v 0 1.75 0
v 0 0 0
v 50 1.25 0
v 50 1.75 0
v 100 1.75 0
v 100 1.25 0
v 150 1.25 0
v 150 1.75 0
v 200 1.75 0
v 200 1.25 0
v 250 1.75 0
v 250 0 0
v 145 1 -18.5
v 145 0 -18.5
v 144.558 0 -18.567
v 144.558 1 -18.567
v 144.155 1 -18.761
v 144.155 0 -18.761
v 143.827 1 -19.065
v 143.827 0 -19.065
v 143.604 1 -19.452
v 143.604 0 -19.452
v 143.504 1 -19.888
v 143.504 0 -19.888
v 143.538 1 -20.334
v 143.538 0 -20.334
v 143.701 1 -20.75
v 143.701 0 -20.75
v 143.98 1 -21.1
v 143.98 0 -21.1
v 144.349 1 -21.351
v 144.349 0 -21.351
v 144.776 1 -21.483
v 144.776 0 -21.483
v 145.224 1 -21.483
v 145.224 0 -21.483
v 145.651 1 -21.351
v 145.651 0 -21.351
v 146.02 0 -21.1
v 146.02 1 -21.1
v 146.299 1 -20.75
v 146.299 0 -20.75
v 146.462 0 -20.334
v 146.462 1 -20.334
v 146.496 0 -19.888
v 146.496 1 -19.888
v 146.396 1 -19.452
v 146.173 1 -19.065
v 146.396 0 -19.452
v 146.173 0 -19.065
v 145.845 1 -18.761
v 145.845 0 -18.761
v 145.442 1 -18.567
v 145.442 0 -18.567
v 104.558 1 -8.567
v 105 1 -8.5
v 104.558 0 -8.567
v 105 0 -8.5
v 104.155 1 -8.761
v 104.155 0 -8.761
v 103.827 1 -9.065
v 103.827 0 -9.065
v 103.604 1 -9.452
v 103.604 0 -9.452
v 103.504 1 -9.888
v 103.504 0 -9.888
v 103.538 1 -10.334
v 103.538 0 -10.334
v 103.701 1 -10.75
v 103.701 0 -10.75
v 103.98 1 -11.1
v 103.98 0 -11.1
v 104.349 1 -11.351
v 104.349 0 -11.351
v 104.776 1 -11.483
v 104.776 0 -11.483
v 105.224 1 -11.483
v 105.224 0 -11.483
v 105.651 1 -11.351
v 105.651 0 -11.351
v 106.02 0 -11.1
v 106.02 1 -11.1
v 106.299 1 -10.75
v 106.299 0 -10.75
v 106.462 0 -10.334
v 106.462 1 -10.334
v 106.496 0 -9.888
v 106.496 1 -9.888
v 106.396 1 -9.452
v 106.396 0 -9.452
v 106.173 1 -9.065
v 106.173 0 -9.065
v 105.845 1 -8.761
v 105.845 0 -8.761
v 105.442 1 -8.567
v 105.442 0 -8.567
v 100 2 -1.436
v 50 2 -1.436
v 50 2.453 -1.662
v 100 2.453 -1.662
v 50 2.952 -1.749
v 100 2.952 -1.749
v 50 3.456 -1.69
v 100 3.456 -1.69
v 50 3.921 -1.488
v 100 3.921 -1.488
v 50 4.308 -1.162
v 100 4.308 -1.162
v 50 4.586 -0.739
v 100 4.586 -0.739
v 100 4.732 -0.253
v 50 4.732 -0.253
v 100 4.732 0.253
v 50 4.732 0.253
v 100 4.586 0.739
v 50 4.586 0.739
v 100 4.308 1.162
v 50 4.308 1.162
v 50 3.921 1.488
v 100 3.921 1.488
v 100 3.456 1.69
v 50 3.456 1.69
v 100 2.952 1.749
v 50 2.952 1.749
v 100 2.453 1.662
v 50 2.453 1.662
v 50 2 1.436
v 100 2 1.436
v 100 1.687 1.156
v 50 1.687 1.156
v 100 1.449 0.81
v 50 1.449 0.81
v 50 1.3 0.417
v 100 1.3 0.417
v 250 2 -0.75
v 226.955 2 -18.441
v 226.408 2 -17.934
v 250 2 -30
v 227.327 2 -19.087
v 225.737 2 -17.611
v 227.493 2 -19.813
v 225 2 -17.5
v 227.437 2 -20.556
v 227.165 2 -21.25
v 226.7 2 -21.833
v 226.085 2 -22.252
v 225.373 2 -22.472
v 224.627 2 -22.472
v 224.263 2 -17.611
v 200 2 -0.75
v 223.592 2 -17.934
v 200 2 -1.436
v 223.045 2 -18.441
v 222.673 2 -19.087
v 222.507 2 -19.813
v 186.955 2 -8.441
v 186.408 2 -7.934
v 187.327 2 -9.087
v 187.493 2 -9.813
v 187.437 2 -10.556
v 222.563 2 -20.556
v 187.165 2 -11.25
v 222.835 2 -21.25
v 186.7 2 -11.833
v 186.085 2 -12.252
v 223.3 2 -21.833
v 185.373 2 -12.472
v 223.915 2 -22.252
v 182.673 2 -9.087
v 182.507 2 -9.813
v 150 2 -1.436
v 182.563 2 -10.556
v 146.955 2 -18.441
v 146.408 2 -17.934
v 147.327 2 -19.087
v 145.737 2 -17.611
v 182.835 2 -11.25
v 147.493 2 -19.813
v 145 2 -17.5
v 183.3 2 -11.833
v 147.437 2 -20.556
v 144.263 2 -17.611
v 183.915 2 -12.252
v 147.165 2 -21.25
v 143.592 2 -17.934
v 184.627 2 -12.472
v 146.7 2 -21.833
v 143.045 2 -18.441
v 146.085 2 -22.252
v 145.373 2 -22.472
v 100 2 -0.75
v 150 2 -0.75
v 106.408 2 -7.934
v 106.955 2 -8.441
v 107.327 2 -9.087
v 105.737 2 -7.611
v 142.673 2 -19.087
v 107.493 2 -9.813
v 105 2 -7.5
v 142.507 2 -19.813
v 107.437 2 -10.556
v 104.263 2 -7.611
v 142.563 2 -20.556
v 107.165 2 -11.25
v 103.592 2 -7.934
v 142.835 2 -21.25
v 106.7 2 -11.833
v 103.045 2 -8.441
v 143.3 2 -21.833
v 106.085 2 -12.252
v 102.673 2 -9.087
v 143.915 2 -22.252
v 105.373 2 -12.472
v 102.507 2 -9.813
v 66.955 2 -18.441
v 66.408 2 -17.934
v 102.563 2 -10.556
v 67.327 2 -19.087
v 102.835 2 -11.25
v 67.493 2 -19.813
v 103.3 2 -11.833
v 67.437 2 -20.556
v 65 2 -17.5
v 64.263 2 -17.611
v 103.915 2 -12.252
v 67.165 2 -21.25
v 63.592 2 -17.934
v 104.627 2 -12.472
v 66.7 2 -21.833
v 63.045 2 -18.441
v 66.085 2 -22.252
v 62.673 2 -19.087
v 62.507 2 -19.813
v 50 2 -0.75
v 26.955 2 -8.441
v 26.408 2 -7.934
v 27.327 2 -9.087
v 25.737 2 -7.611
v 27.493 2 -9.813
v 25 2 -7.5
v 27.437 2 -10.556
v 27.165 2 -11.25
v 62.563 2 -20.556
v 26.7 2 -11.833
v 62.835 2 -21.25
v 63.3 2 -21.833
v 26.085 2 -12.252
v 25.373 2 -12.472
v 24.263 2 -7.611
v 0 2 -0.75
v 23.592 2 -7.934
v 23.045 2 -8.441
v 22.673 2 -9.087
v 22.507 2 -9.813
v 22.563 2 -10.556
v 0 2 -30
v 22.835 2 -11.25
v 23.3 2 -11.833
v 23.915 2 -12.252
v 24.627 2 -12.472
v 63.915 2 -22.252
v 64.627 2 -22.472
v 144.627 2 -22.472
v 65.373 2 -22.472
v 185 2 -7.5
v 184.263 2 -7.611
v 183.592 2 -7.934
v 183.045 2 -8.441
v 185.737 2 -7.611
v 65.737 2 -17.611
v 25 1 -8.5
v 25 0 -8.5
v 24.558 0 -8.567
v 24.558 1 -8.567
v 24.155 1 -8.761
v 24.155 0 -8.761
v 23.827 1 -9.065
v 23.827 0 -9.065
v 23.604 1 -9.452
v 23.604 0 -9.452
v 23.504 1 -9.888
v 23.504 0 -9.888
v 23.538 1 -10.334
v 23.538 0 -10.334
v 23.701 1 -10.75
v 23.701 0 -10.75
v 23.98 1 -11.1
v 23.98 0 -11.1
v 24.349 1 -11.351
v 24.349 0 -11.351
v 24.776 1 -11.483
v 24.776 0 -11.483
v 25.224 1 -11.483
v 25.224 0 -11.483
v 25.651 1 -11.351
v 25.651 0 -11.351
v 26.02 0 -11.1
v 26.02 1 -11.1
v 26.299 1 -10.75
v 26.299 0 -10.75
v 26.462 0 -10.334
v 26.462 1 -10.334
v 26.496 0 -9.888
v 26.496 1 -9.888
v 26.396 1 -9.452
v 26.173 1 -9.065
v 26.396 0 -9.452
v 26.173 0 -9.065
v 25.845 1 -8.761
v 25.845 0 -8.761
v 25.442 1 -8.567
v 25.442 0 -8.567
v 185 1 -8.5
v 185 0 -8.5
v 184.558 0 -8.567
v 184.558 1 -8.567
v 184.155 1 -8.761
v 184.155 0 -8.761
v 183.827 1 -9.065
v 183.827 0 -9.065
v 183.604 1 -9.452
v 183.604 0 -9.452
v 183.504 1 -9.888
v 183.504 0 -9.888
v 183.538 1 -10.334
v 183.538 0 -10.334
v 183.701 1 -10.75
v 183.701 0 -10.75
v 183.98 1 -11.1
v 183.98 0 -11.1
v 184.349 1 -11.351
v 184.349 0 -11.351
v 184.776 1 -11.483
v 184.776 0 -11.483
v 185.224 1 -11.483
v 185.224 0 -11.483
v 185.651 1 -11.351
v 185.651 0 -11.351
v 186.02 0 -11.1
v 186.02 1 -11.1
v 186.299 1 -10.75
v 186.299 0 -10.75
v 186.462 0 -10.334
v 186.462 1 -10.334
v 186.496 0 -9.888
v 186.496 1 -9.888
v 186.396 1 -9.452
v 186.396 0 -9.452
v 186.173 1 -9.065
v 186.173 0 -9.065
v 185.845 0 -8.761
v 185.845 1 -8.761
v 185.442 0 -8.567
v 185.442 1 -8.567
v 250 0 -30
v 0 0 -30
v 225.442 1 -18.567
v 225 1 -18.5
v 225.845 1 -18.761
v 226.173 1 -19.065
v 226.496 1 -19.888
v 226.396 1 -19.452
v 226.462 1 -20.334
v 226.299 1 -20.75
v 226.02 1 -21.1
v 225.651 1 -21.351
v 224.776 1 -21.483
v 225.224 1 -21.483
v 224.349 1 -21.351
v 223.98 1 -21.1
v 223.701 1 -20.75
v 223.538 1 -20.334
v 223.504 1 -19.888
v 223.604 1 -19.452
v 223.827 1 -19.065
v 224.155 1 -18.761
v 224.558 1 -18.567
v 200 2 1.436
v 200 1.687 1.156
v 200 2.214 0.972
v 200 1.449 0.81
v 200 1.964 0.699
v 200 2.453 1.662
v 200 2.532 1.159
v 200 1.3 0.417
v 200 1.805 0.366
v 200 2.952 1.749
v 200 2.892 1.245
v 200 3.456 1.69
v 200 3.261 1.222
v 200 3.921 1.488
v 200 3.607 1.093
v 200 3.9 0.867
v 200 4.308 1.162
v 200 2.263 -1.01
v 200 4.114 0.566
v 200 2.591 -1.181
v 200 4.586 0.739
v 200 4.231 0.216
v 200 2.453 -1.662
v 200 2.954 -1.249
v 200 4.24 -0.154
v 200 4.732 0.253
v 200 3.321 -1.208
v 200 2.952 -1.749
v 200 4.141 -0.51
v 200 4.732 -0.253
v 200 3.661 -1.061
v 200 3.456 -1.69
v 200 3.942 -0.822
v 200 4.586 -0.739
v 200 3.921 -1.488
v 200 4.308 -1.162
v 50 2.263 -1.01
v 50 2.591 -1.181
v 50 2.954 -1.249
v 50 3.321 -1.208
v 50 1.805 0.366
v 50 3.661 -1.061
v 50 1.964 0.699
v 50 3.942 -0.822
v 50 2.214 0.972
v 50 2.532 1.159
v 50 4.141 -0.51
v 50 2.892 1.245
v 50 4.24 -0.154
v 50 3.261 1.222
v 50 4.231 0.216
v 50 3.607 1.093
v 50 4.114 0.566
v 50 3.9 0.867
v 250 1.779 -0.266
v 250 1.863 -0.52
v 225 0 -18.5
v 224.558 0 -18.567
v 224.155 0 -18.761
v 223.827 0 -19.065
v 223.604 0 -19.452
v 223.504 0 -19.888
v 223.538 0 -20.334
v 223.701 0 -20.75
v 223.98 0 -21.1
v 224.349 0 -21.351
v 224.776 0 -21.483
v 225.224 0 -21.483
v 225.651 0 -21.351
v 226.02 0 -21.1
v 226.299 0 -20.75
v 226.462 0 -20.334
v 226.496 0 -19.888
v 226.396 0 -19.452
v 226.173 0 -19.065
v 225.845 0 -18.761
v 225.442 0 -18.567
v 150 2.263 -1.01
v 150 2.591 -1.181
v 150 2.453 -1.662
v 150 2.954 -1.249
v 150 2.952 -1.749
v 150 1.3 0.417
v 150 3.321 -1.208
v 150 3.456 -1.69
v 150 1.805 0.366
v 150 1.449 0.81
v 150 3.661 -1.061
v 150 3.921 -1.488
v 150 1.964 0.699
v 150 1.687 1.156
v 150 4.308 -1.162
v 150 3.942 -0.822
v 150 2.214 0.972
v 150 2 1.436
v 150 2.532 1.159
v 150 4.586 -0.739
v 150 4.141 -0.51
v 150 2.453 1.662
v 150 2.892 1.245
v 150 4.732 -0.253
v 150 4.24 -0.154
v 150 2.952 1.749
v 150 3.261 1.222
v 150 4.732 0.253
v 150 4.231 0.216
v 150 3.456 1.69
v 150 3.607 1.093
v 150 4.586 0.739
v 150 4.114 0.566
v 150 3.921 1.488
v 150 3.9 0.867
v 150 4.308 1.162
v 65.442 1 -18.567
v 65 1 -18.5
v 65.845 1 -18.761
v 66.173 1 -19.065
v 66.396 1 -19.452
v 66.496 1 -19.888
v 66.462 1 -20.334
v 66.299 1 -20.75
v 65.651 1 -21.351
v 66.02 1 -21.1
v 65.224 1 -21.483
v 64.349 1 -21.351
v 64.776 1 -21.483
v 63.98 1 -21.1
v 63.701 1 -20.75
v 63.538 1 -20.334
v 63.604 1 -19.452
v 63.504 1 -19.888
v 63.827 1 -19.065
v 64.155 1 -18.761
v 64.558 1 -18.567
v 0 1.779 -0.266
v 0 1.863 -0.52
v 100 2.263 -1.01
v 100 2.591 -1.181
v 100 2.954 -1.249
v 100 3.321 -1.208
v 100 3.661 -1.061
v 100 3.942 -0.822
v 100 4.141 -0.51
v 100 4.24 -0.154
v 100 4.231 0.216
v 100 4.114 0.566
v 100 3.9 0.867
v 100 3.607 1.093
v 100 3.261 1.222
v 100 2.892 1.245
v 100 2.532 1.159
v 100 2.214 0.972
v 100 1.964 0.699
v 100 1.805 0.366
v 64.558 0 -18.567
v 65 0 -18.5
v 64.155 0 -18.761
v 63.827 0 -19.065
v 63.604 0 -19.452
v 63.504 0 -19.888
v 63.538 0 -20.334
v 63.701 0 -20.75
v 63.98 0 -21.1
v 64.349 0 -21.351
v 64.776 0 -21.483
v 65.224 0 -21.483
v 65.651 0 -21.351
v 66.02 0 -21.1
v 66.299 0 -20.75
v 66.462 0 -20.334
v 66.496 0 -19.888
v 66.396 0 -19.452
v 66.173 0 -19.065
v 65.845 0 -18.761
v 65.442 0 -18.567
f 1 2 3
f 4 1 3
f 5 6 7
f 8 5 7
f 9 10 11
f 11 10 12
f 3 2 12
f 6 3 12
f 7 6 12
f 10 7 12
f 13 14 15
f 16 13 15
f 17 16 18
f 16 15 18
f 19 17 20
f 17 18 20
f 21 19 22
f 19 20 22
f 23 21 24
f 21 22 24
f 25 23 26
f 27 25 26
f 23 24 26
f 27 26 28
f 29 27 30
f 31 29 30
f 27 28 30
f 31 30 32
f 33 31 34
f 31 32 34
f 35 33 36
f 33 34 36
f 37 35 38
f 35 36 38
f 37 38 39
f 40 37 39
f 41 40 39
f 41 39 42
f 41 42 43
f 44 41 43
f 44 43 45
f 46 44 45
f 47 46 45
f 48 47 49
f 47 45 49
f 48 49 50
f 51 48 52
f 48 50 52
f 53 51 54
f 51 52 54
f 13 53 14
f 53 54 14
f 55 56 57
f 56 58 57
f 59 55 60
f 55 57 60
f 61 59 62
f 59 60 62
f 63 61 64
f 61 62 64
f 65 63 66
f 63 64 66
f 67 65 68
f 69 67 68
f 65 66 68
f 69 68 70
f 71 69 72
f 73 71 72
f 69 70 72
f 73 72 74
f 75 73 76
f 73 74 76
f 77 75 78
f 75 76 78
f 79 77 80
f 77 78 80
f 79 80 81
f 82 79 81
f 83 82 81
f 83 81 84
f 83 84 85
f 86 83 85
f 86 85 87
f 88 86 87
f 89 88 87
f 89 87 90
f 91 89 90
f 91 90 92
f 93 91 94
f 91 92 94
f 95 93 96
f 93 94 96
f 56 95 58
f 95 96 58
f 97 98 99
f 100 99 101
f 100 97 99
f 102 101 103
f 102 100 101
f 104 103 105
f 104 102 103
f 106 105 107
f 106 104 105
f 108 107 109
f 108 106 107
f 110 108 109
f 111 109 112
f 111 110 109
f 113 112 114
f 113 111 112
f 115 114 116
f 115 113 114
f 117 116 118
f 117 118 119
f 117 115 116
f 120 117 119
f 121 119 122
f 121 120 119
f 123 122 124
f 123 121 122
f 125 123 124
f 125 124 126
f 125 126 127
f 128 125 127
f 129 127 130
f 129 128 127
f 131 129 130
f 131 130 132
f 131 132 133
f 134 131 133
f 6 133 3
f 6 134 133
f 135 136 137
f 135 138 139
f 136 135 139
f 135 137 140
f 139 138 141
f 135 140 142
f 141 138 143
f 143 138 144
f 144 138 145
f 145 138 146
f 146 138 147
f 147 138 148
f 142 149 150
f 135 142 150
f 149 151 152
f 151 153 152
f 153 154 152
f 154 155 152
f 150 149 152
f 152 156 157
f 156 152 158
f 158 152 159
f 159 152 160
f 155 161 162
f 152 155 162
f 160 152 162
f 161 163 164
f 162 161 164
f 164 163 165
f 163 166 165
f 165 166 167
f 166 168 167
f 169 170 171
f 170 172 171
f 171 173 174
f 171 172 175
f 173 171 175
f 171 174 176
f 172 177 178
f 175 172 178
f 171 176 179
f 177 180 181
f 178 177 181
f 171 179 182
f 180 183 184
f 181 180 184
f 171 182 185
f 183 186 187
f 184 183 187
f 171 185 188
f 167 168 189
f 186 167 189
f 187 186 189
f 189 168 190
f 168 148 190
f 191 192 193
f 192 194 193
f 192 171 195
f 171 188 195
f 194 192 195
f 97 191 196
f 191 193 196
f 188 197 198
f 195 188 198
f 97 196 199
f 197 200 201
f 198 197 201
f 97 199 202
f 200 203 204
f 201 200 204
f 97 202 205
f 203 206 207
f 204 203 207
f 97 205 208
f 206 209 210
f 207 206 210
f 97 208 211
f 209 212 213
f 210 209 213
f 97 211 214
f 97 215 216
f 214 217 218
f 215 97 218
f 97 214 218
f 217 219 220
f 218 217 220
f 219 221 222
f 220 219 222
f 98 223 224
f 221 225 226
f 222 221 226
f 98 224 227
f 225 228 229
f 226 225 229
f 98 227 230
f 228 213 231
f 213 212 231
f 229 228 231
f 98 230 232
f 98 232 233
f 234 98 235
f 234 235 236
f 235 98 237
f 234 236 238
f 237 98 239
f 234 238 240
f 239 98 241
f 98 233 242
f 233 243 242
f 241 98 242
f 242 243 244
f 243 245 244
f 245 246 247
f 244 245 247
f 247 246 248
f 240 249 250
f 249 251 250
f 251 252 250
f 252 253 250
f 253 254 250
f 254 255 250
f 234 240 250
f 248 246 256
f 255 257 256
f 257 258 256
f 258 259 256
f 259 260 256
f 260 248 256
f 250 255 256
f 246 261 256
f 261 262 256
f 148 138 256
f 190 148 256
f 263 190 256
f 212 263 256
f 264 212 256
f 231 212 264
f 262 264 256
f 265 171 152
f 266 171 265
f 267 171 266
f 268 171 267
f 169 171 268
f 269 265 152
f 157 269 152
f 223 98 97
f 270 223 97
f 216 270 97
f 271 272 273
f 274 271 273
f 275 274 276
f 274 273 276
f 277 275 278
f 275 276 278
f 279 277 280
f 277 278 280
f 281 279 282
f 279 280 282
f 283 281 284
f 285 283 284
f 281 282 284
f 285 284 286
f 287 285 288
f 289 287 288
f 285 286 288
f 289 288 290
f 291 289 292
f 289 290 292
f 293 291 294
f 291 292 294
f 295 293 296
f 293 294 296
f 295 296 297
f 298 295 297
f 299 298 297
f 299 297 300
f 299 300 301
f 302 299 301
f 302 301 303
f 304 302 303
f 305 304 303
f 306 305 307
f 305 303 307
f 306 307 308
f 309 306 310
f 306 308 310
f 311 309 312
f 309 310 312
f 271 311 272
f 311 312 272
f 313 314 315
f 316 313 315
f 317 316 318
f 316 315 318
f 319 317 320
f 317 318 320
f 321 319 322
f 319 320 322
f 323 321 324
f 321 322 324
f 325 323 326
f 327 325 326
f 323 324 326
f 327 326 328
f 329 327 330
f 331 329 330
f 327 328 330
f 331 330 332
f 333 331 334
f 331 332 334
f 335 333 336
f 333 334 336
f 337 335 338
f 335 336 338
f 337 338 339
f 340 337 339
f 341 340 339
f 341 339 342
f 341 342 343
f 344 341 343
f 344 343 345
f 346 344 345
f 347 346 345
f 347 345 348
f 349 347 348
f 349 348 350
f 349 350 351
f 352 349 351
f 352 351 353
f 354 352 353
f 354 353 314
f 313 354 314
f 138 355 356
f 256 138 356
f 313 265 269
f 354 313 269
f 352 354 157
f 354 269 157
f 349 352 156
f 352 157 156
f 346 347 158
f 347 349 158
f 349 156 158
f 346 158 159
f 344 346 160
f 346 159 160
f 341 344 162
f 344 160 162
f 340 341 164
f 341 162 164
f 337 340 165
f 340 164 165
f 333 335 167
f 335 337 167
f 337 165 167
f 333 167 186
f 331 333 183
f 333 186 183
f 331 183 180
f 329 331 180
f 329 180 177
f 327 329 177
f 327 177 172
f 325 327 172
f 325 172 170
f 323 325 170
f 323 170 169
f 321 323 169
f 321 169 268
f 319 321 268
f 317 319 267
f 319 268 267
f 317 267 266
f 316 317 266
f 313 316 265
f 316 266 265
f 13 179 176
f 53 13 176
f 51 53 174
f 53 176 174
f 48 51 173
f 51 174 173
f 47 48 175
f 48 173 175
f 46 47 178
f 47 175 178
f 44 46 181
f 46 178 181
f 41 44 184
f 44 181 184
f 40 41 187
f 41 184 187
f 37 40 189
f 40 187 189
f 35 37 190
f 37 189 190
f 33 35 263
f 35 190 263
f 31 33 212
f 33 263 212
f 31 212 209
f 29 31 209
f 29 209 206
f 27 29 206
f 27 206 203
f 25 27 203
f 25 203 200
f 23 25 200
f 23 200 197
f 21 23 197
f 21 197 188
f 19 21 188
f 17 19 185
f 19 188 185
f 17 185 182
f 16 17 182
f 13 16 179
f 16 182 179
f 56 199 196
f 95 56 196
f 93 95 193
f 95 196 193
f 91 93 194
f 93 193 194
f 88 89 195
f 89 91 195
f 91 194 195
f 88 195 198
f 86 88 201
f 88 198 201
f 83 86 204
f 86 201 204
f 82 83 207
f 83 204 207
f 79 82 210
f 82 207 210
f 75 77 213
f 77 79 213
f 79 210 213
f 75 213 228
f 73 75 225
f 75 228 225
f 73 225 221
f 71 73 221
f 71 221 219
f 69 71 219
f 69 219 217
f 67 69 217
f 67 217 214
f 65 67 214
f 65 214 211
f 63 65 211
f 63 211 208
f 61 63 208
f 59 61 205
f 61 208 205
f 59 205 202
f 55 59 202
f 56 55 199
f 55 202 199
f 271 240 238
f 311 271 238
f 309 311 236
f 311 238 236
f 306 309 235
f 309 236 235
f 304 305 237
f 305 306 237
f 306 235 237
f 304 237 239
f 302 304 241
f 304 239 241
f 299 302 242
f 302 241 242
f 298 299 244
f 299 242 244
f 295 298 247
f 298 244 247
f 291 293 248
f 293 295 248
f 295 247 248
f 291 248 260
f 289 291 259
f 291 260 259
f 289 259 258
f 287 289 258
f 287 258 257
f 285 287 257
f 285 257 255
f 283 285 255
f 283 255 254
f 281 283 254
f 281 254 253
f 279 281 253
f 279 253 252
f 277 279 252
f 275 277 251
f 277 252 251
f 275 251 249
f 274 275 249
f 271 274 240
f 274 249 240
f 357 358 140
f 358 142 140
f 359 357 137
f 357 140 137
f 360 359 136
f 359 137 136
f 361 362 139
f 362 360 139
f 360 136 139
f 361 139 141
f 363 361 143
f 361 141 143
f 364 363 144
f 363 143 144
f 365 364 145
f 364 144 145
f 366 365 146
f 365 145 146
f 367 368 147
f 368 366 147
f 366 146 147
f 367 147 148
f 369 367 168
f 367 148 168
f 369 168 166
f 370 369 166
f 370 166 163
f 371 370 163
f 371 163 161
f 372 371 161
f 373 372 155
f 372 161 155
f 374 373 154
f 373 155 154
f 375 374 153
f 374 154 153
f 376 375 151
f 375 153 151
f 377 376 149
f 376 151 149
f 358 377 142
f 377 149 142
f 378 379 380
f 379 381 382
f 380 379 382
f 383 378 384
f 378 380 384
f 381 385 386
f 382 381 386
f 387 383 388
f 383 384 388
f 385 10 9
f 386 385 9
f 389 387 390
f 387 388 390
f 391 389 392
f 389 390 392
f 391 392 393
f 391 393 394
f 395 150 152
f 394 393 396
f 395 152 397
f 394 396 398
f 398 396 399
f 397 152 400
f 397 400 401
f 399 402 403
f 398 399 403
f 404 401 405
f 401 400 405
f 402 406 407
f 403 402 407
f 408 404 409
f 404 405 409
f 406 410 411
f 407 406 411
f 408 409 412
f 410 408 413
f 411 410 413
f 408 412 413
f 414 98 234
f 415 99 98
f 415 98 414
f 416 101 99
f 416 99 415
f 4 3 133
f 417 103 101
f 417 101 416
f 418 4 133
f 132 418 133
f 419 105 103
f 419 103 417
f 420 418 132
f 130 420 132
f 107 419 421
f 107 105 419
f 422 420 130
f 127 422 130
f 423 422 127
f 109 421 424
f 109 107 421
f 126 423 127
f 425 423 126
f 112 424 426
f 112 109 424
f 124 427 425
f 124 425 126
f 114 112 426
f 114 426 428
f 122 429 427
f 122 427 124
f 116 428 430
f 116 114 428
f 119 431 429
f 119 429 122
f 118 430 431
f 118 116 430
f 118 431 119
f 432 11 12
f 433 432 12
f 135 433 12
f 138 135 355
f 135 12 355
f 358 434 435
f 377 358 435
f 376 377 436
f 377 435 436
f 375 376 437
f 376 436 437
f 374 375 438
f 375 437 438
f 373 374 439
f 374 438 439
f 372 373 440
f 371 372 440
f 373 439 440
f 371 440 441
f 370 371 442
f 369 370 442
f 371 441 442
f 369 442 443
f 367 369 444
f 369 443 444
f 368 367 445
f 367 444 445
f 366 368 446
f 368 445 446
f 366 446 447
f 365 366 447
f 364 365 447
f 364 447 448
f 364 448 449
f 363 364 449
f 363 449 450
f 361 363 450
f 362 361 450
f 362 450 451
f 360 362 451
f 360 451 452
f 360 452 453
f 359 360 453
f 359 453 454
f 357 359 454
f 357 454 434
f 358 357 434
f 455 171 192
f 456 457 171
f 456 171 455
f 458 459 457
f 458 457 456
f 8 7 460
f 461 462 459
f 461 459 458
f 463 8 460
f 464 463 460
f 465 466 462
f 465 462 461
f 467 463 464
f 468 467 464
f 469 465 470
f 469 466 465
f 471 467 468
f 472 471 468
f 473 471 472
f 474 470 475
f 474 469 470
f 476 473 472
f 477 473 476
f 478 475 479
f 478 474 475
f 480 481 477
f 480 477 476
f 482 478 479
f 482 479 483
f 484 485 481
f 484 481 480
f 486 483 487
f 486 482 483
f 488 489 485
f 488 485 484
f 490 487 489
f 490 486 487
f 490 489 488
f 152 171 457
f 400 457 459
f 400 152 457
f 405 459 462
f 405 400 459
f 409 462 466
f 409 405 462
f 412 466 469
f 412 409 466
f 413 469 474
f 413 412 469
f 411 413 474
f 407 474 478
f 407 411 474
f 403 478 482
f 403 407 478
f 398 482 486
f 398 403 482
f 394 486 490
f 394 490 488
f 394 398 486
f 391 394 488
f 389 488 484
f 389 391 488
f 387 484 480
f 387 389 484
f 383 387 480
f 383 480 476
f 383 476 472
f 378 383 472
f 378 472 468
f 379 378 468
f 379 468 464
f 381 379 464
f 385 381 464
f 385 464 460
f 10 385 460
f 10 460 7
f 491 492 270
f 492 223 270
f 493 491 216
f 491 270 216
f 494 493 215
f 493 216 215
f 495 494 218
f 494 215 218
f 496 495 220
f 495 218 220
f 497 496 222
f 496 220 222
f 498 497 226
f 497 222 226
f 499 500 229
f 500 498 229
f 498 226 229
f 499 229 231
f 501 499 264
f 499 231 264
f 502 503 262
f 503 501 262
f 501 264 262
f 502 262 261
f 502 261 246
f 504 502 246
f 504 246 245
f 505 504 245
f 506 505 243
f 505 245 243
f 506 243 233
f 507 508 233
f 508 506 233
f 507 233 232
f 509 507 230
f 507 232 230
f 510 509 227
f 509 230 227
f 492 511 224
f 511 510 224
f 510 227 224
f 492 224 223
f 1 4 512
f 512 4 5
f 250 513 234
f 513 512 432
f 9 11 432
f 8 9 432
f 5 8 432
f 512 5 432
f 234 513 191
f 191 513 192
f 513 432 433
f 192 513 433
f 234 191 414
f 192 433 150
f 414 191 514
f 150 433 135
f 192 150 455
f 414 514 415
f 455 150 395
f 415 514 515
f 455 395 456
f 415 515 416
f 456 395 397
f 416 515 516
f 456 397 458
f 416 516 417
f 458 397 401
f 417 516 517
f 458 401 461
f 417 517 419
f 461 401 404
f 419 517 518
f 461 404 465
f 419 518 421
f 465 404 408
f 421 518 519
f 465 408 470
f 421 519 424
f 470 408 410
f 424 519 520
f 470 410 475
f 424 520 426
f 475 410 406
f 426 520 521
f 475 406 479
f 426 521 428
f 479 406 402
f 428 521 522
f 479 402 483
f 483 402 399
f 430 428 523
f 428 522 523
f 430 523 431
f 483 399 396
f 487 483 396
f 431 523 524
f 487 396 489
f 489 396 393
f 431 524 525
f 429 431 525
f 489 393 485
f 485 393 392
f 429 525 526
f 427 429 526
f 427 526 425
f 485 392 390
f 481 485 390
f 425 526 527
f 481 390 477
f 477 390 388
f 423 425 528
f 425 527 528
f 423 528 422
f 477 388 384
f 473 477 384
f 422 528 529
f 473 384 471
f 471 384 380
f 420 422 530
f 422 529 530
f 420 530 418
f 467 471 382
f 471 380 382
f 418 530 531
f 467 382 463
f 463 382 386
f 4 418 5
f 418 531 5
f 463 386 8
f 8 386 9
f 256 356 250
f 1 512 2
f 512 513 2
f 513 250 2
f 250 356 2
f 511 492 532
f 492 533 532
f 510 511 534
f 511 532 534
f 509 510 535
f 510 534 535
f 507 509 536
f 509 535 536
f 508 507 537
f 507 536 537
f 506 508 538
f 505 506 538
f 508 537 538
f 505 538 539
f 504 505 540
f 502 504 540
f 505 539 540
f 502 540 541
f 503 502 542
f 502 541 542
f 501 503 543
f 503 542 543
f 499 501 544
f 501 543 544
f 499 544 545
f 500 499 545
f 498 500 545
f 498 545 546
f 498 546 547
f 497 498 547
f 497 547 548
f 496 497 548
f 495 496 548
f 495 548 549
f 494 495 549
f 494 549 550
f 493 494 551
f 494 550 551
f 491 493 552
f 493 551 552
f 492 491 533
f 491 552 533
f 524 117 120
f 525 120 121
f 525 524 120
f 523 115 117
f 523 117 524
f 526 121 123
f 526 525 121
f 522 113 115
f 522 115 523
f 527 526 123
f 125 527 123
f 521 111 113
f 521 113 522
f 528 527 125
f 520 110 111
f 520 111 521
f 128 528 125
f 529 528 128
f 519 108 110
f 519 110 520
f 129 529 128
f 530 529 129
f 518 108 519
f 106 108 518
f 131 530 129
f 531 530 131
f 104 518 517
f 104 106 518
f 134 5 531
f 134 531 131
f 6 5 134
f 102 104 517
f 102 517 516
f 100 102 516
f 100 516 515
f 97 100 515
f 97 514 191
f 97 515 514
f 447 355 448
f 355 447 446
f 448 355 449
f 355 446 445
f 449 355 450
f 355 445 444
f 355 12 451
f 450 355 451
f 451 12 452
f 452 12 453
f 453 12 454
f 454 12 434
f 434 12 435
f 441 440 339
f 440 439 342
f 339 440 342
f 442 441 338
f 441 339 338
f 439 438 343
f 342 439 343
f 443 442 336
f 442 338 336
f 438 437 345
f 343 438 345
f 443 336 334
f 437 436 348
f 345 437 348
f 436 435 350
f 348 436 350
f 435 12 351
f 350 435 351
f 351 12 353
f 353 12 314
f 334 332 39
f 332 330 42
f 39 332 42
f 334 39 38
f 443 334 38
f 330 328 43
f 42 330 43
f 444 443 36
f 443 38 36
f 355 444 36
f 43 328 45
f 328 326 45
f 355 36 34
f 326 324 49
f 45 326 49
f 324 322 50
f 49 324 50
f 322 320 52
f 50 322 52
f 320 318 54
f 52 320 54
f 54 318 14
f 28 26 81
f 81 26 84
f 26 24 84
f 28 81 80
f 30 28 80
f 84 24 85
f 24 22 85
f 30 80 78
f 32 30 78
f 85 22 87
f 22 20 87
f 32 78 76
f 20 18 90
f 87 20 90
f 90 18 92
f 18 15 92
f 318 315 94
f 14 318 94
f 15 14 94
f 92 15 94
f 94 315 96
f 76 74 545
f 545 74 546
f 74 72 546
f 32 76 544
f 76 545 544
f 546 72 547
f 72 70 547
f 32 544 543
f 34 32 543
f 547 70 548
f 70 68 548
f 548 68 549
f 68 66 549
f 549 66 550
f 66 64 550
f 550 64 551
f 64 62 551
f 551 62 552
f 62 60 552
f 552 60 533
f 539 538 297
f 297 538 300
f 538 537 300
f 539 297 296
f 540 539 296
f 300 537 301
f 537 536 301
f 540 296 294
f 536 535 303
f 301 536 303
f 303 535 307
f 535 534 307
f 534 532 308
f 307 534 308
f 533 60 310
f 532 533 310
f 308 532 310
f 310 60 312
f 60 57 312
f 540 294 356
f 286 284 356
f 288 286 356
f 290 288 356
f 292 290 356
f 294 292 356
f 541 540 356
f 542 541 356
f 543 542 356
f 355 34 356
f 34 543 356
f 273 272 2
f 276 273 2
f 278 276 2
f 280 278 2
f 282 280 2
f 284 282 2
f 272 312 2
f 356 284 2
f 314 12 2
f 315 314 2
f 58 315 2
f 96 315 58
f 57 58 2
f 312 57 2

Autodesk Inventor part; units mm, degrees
ref_plane "YZ Plane" through (0, 0, 0) normal (1, 0, 0) x (0, 1, 0)
ref_plane "XZ Plane" through (0, 0, 0) normal (0, 1, 0) x (-1, 0, 0)
ref_plane "XY Plane" through (0, 0, 0) normal (0, 0, 1) x (1, 0, 0)
sketch "Sketch1" plane through (0, 0, 0) normal (0, 1, 0) x (-1, 0, 0)
  line L0 (0, 0) -> (-250, 0)
  line L1 (-250, 0) -> (-250, -30)
  line L2 (-250, -30) -> (0, -30)
  line L3 (0, -30) -> (0, 0)
  dimension "d0" = 250
  dimension "d1" = 30
extrude "Extrusion1" add sketch "Sketch1" along normal blind 2
sketch "Sketch2" plane through (250, 0, 0) normal (1, 0, 0) x (0, 0, -1)
  circle A0 centre (0, 3) radius 1.25
  circle A1 centre (0, 3) radius 1.75
  point P0 (0, 0)
  dimension "d4" = 2.5
  dimension "d5" = 3
  dimension "d6" = 3.5
extrude "Extrusion2" add sketch "Sketch2" against normal blind 250
extrude "Extrusion3" cut sketch "Sketch2" against normal blind 250 contours A0
sketch "Sketch3" plane through (250, 0, -30) normal (0, 0, -1) x (-1, 0, 0)
  line L0 (0, 2) -> (250, 2) projected
  line L1 (0, 2) -> (50, 2)
  line L2 (50, 2) -> (50, 4.75)
  line L3 (50, 4.75) -> (0, 4.75)
  line L4 (0, 4.75) -> (0, 2)
  line L5 (100, 4.75) -> (150, 4.75)
  line L6 (150, 4.75) -> (150, 2)
  line L7 (150, 2) -> (100, 2)
  line L8 (100, 2) -> (100, 4.75)
  line L9 (200, 4.75) -> (250, 4.75)
  line L10 (250, 4.75) -> (250, 2)
  line L11 (250, 2) -> (200, 2)
  line L12 (200, 2) -> (200, 4.75)
  point P0 (250, 0)
  point P1 (125, 2)
  point P2 (125, 2)
  point P3 (225, 2)
  dimension "d11" = 50
  dimension "d12" = 2.75
  dimension "d13" = 50
  dimension "d14" = 2.75
  dimension "d15" = 50
  dimension "d16" = 50
  dimension "d17" = 2.75
  dimension "d18" = 50
extrude "Extrusion4" cut sketch "Sketch3" against normal through all
sketch "Sketch4" plane through (200, 2, 1.4361) normal (0, 1, 0) x (1, 0, 0)
  line L0 (-200, 1.4361) -> (-200, 0) projected
  line L1 (-150, 0) -> (-200, 0) projected
  line L2 (-200, 1.4361) -> (-150, 1.4361)
  line L3 (-150, 1.4361) -> (-150, 0)
  line L4 (-150, 0) -> (-200, 0)
  line L5 (-200, 0) -> (-200, 1.4361)
  line L6 (-100, 0.1861) -> (-100, 2.6861) projected
  line L7 (-50, 0.6861) -> (-50, 0) projected
  line L8 (-100, 1.4361) -> (-50, 1.4361)
  line L9 (-50, 1.4361) -> (-50, 0)
  line L10 (-50, 0) -> (-100, 0)
  line L11 (-100, 0) -> (-100, 1.4361)
  line L12 (50, 2.1861) -> (50, 0.6861) projected
  line L13 (50, 0) -> (0, 0) projected
  line L14 (50, 1.4361) -> (0, 1.4361)
  line L15 (0, 1.4361) -> (0, 0)
  line L16 (0, 0) -> (50, 0)
  line L17 (50, 0) -> (50, 1.4361)
  point P0 (-100, 2.1861)
  point P1 (-100, 0.6861)
extrude "Extrusion5" cut sketch "Sketch4" against normal through all
sketch "Sketch5" plane through (0, 2, 0) normal (0, 1, 0) x (1, 0, 0)
  line L0 (100, 1.75) -> (100, -1.75) projected
  line L1 (0, 0) -> (50, 0) projected
  point P0 (25, 10)
  point P1 (65, 20)
  point P2 (105, 10)
  point P3 (145, 20)
  point P4 (185, 10)
  point P5 (225, 20)
  point P6 (100, 0)
  point P7 (100, 1.4361)
  dimension "d23" = 40
  dimension "d24" = 5
  dimension "d25" = 40
  dimension "d26" = 40
  dimension "d27" = 40
  dimension "d28" = 40
  dimension "d29" = 10
  dimension "d30" = 10
hole "Hole1" at (25, 2, -10) at (65, 2, -20) at (105, 2, -10) at (145, 2, -20) at (185, 2, -10) at (225, 2, -20) direction (0, -1, 0) diameter 3 end through all countersink diameter 5 countersink angle 90
equation "\"d13\" = d11"
equation "\"d15\" = d11"
equation "\"d16\" = d11"
equation "\"d18\" = d11"
equation "\"d25\" = d23"
equation "\"d26\" = d23"
equation "\"d27\" = d23"
equation "\"d28\" = d23"
properties part number "Hinge 1 of 2" material "Steel"
